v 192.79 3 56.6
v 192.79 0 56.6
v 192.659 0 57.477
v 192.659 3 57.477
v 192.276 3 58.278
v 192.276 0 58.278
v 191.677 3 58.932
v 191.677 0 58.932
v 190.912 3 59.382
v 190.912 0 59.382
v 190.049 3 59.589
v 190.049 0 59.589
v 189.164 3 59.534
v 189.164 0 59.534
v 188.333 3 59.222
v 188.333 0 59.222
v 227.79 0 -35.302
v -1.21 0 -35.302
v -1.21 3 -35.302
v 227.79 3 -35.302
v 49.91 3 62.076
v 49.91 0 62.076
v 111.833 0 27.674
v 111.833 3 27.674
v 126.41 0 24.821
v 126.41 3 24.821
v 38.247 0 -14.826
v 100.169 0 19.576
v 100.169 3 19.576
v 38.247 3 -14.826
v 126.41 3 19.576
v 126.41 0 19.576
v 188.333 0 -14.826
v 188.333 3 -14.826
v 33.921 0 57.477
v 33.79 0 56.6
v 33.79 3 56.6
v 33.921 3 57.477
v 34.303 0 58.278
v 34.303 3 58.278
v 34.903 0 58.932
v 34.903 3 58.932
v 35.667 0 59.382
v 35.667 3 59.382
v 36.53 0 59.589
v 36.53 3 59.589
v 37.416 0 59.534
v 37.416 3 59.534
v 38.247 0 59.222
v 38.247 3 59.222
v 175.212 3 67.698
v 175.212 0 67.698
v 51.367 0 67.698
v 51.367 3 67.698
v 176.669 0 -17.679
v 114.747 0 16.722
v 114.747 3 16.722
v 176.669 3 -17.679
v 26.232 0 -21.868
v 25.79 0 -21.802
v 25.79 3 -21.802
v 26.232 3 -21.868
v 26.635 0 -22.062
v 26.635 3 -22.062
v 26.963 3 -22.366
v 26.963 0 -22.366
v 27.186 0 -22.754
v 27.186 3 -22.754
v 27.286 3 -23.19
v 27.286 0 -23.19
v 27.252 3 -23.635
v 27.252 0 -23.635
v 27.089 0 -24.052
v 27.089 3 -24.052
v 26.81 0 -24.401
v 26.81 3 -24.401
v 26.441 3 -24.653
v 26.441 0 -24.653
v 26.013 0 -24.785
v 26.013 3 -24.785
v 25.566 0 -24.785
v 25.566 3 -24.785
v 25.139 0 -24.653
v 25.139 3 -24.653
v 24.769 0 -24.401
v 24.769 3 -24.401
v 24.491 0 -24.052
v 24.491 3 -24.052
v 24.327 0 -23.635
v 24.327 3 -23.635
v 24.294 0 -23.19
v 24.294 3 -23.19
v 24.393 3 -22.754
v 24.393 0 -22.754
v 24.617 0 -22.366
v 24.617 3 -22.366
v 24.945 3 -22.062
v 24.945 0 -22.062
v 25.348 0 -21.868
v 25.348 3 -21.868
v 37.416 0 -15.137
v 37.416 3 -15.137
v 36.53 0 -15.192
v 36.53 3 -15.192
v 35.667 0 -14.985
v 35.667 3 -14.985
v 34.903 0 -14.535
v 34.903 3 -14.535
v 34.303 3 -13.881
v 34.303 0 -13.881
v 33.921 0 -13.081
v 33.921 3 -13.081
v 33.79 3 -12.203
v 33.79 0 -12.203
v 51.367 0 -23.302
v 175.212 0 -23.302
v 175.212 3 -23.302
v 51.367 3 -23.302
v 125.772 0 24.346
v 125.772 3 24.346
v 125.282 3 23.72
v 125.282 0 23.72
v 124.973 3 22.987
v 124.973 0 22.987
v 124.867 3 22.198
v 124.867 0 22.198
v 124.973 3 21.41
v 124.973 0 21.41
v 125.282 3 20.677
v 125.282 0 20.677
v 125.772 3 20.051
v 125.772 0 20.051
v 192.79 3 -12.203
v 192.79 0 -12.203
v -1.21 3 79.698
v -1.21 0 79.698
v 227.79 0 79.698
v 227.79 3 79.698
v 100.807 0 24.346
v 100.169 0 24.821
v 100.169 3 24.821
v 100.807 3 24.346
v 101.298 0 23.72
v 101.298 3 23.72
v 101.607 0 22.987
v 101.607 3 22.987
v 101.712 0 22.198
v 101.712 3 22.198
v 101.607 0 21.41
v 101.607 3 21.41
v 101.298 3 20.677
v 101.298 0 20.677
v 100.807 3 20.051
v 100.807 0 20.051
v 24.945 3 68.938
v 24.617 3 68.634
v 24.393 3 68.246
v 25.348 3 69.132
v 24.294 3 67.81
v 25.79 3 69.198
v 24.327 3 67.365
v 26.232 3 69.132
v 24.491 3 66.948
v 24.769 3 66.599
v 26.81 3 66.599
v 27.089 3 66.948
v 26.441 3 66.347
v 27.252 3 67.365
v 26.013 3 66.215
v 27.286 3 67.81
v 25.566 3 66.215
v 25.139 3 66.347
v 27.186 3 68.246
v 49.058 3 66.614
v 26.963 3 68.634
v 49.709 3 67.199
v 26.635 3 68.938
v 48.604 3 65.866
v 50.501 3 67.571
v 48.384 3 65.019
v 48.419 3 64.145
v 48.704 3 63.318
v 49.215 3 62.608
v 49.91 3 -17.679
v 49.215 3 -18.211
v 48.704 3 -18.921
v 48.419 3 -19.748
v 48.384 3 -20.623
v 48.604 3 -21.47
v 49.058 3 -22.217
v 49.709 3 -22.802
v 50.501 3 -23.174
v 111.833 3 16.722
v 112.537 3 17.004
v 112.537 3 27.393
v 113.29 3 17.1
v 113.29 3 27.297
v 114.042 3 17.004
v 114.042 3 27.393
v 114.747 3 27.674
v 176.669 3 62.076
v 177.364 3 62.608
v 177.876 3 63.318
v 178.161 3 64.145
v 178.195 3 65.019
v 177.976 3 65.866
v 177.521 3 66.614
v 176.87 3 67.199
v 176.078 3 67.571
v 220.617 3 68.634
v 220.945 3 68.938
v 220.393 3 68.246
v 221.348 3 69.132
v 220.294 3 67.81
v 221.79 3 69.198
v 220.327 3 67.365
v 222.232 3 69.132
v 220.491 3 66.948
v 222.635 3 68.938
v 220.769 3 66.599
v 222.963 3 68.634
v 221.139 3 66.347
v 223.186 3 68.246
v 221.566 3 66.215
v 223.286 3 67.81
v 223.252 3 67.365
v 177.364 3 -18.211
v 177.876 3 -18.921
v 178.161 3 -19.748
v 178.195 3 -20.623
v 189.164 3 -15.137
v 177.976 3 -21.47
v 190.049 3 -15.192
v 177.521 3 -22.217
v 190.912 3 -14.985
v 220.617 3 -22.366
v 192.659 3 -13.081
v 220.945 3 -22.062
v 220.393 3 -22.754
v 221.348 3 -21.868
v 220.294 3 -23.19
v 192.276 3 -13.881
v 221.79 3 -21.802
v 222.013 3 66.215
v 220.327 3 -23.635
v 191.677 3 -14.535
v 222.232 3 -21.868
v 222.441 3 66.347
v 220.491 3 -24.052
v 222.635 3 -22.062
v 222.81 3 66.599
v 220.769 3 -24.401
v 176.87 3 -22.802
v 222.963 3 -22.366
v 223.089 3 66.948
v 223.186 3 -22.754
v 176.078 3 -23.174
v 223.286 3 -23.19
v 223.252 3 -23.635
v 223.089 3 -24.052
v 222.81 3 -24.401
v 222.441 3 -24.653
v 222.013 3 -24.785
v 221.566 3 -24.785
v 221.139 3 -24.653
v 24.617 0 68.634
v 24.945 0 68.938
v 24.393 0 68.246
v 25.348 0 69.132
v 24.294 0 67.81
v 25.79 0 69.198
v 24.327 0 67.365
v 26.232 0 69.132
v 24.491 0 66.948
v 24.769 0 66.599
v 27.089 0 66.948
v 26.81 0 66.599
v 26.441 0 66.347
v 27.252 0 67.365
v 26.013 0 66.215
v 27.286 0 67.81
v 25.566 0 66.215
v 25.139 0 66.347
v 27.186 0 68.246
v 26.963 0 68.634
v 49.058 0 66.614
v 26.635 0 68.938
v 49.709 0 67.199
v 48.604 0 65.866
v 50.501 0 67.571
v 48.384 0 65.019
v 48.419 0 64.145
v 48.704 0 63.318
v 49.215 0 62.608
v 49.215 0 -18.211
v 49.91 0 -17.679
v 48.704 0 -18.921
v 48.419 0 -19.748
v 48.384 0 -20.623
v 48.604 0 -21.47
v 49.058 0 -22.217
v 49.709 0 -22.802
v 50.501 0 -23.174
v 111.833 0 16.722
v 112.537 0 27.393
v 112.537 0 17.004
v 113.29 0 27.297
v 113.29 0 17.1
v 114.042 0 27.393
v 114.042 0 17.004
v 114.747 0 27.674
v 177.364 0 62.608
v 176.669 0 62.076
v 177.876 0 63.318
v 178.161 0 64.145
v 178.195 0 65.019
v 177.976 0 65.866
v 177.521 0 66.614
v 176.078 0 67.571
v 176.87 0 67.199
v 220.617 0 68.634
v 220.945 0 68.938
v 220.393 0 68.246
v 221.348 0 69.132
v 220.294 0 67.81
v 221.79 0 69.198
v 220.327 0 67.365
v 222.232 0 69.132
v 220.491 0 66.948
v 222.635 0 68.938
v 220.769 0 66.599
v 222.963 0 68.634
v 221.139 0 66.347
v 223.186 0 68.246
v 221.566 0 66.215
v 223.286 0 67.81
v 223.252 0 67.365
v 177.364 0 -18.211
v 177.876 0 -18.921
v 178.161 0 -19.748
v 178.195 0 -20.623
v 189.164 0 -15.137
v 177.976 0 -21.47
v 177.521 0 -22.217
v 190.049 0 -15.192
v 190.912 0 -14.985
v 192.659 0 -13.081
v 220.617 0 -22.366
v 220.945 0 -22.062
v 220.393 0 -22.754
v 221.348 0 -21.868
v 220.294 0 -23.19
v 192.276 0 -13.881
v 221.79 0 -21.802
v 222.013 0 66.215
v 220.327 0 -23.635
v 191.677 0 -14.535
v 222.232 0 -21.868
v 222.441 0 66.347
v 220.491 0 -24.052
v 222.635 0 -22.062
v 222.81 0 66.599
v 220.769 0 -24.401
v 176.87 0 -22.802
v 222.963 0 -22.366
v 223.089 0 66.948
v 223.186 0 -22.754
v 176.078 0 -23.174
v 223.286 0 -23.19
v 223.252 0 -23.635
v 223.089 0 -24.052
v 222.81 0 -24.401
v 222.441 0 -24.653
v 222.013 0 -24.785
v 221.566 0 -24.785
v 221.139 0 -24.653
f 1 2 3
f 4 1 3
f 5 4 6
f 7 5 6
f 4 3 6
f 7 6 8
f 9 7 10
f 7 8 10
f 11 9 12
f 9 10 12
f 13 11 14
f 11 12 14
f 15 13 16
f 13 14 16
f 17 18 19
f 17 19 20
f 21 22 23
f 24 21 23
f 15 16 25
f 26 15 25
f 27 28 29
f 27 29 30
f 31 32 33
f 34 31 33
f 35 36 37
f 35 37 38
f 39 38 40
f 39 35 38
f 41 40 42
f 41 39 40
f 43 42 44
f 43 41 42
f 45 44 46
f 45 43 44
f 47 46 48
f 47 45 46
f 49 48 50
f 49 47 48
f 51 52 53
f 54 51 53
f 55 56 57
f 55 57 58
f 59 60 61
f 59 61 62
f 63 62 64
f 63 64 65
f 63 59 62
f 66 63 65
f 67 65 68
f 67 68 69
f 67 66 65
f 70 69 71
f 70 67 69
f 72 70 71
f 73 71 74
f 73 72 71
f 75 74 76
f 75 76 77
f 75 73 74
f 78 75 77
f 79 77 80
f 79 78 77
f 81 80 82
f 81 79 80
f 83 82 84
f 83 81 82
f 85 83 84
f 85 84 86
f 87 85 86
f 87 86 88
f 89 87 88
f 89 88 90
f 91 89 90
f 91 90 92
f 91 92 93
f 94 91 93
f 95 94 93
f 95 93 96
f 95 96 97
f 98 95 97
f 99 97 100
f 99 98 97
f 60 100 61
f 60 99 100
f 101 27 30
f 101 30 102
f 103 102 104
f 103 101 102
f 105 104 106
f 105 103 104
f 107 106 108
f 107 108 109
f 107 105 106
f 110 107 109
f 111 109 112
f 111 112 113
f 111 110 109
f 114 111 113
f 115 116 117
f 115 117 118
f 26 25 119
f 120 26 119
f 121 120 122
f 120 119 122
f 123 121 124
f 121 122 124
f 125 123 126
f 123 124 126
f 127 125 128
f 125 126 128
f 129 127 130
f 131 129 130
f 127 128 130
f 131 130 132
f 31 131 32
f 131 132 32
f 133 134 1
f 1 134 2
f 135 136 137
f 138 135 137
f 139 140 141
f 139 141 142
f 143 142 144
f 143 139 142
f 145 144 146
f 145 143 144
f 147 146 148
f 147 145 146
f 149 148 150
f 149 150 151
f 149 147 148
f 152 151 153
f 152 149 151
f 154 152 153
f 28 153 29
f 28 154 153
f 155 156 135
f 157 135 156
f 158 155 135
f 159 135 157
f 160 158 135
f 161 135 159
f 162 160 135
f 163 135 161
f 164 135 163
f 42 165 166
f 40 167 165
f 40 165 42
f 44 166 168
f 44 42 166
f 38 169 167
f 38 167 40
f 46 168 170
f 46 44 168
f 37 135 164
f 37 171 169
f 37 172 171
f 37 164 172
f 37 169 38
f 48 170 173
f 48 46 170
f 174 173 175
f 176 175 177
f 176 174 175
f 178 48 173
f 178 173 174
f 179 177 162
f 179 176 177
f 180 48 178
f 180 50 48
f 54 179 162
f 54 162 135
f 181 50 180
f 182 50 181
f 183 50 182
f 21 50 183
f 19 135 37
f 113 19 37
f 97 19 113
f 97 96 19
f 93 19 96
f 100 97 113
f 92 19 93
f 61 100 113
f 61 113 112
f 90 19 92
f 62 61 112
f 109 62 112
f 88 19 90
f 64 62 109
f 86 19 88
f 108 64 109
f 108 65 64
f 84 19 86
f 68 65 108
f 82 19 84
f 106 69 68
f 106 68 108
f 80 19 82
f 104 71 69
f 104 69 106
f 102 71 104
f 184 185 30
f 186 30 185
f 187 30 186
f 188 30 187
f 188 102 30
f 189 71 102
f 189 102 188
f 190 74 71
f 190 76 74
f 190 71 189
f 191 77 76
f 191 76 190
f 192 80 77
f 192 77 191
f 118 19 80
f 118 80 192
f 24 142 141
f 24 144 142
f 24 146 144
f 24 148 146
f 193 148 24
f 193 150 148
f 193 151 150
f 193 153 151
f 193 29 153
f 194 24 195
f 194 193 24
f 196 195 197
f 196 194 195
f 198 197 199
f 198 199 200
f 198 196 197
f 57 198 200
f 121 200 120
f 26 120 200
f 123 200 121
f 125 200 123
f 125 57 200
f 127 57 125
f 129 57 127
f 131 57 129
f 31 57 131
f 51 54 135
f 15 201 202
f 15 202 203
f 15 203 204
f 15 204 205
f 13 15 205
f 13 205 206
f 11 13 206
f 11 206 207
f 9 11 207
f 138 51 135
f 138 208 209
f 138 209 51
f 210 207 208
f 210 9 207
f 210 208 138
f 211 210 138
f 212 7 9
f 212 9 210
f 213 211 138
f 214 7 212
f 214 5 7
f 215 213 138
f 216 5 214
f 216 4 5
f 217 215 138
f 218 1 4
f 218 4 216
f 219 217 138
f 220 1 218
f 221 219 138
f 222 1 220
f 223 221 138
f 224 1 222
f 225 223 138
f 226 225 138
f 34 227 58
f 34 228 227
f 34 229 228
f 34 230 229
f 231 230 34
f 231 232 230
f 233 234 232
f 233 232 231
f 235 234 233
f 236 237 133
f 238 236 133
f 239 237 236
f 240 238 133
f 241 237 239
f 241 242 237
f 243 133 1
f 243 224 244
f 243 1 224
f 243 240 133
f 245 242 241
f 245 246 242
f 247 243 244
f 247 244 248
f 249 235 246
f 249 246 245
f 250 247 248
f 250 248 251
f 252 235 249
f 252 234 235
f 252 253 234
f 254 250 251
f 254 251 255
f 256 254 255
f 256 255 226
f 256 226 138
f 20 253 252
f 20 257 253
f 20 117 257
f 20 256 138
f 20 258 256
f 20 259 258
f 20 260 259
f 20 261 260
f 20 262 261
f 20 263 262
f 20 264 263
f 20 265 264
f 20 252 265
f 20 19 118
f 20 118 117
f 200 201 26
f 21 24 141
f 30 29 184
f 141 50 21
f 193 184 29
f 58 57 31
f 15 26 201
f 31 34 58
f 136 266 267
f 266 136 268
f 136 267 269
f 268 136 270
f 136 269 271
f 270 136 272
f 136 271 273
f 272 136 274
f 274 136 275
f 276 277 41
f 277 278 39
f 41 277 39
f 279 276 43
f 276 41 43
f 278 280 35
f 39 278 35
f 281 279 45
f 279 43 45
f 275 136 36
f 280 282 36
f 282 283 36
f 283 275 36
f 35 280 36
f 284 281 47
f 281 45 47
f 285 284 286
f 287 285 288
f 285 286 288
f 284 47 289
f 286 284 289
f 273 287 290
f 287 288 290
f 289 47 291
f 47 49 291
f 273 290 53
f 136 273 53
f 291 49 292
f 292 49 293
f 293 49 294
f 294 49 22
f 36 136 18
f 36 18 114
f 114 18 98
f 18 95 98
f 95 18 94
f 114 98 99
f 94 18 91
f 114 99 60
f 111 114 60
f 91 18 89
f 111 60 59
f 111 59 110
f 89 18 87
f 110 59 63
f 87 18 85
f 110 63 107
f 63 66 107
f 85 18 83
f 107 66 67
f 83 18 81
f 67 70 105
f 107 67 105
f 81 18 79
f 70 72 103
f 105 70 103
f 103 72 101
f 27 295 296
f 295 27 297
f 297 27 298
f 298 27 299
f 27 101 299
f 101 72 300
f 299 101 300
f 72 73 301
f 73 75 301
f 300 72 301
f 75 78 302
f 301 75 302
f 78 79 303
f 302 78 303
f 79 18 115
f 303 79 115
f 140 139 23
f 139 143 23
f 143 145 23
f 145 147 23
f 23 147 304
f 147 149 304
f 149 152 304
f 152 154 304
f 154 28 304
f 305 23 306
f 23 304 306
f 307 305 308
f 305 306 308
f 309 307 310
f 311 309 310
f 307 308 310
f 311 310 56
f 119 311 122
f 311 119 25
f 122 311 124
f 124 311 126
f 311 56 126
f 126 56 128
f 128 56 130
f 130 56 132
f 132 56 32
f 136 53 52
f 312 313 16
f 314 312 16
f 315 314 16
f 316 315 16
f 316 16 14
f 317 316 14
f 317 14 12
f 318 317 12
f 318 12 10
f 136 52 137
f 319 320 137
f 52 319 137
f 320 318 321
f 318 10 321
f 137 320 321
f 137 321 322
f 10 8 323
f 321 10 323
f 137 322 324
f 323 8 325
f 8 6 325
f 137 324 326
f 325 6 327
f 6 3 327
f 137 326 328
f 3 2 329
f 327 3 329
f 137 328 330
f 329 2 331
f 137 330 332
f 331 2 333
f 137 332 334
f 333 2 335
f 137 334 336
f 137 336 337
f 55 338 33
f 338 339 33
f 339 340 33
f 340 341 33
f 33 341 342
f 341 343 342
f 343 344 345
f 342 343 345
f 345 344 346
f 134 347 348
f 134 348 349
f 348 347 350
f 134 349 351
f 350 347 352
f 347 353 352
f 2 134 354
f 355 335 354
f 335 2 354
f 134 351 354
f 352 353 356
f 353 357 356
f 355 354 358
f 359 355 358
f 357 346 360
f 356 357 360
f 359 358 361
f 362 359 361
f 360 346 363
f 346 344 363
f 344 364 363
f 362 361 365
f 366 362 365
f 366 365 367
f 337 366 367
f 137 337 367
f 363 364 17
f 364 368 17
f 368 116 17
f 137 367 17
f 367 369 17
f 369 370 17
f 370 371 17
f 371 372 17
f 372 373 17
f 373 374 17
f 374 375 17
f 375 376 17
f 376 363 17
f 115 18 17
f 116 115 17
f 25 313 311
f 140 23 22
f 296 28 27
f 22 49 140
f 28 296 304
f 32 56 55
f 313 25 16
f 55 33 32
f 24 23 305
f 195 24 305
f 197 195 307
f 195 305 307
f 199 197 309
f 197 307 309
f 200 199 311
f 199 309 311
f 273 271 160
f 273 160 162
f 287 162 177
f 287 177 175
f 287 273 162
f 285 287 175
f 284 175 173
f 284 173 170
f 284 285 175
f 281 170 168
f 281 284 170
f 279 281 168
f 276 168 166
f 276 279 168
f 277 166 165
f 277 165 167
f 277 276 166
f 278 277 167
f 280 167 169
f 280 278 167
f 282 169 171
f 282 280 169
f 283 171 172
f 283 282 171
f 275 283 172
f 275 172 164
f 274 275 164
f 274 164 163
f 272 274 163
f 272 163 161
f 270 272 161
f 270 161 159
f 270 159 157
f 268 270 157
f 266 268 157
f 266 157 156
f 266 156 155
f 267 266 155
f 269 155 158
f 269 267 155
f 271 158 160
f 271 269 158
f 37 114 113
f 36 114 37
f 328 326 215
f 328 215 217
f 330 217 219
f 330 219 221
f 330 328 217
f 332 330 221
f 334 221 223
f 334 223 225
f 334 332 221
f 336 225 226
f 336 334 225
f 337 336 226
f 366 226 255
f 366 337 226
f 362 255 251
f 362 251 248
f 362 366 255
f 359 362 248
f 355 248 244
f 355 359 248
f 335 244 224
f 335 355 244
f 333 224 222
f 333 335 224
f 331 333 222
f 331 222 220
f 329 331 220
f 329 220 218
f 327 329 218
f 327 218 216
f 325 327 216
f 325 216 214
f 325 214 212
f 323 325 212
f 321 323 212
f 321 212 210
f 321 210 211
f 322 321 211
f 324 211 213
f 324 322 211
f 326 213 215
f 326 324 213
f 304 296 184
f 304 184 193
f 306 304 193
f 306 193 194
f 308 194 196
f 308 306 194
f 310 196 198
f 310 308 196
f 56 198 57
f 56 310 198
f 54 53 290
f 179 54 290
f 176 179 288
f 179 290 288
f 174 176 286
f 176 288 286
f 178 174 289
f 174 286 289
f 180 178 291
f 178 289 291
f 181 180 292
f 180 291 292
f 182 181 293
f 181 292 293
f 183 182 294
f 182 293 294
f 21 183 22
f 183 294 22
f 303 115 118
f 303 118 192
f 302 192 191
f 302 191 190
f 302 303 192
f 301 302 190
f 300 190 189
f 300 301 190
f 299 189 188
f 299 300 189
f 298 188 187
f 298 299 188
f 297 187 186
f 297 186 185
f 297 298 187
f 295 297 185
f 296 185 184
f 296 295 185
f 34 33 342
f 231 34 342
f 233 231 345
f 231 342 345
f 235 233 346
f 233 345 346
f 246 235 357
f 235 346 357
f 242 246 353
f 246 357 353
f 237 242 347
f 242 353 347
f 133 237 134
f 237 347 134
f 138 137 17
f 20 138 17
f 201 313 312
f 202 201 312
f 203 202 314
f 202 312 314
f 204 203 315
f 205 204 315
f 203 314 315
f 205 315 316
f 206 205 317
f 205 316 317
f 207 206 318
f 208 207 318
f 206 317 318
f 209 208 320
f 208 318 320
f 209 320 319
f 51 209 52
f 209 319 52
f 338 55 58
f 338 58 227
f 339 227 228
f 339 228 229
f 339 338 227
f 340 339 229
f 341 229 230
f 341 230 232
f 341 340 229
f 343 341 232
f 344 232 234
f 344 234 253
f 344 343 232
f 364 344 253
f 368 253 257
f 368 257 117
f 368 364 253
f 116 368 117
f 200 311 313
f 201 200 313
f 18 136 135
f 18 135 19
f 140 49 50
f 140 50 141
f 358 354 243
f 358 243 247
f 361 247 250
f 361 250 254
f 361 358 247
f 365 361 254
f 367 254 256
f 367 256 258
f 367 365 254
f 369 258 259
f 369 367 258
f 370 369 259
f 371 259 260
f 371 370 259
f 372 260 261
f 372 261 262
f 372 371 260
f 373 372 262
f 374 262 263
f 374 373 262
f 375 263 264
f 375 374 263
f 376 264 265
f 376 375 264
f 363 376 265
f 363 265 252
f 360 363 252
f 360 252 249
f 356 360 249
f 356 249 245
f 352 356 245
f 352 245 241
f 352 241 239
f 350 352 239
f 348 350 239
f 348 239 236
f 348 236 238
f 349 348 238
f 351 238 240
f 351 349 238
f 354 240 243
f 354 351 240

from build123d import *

# Parameters (mm, degrees)
SKETCH_1_W      = 229
SKETCH_1_H      = 115
SKETCH_1_R      = 1.5
EXTRUDE_6_DEPTH = 3


with BuildPart() as part:
    # 草图1 → 凸台-拉伸6 (new body)
    with BuildSketch(Plane(origin=(0, 0, 0), x_dir=(1, 0, 0), z_dir=(0, 1, 0))):
        with Locations((113.28975623, -22.19835875)):
            Rectangle(SKETCH_1_W, SKETCH_1_H)
        with Locations(Location((25.78975623, 23.30164125, 0), (0, 0, 270))):
            Circle(SKETCH_1_R, mode=Mode.SUBTRACT)
        with Locations(Location((25.78975623, -67.69835875, 0), (0, 0, 270))):
            Circle(SKETCH_1_R, mode=Mode.SUBTRACT)
        with Locations(Location((221.78975623, 23.30164125, 0), (0, 0, 270))):
            Circle(SKETCH_1_R, mode=Mode.SUBTRACT)
        with Locations(Location((221.78975623, -67.69835875, 0), (0, 0, 270))):
            Circle(SKETCH_1_R, mode=Mode.SUBTRACT)
        with BuildLine():
            Line((49.910205521, 17.679169422), (111.832827436, -16.722287198))
            ThreePointArc((111.832827436, -16.722287198), (113.28975623, -17.099815369), (114.746685023, -16.722287198))
            Line((114.746685023, -16.722287198), (176.669306939, 17.679169422))
            ThreePointArc((176.669306939, 17.679169422), (178.11646281, 21.054165175), (175.212378145, 23.30164125))
            Line((175.212378145, 23.30164125), (51.367134314, 23.30164125))
            ThreePointArc((51.367134314, 23.30164125), (48.463049649, 21.054165175), (49.910205521, 17.679169422))
        make_face(mode=Mode.SUBTRACT)
        with BuildLine():
            Line((192.78975623, 12.20309787), (192.78975623, -56.599815369))
            ThreePointArc((192.78975623, -56.599815369), (191.311139419, -59.185428099), (188.332827436, -59.222287198))
            Line((188.332827436, -59.222287198), (126.410205521, -24.820830578))
            ThreePointArc((126.410205521, -24.820830578), (124.867134314, -22.19835875), (126.410205521, -19.575886921))
            Line((126.410205521, -19.575886921), (188.332827436, 14.825569699))
            ThreePointArc((188.332827436, 14.825569699), (191.311139419, 14.7887106), (192.78975623, 12.20309787))
        make_face(mode=Mode.SUBTRACT)
        with BuildLine():
            Line((114.746685023, -27.674430301), (176.669306939, -62.075886921))
            ThreePointArc((176.669306939, -62.075886921), (178.11646281, -65.450882674), (175.212378145, -67.69835875))
            Line((175.212378145, -67.69835875), (51.367134314, -67.69835875))
            ThreePointArc((51.367134314, -67.69835875), (48.463049649, -65.450882674), (49.910205521, -62.075886921))
            Line((49.910205521, -62.075886921), (111.832827436, -27.674430301))
            ThreePointArc((111.832827436, -27.674430301), (113.28975623, -27.29690213), (114.746685023, -27.674430301))
        make_face(mode=Mode.SUBTRACT)
        with BuildLine():
            Line((100.169306939, -19.575886921), (38.246685023, 14.825569699))
            ThreePointArc((38.246685023, 14.825569699), (35.26837304, 14.7887106), (33.78975623, 12.20309787))
            Line((33.78975623, 12.20309787), (33.78975623, -56.599815369))
            ThreePointArc((33.78975623, -56.599815369), (35.26837304, -59.185428099), (38.246685023, -59.222287198))
            Line((38.246685023, -59.222287198), (100.169306939, -24.820830578))
            ThreePointArc((100.169306939, -24.820830578), (101.712378145, -22.19835875), (100.169306939, -19.575886921))
        make_face(mode=Mode.SUBTRACT)
    extrude(amount=EXTRUDE_6_DEPTH)


solid = part.part
